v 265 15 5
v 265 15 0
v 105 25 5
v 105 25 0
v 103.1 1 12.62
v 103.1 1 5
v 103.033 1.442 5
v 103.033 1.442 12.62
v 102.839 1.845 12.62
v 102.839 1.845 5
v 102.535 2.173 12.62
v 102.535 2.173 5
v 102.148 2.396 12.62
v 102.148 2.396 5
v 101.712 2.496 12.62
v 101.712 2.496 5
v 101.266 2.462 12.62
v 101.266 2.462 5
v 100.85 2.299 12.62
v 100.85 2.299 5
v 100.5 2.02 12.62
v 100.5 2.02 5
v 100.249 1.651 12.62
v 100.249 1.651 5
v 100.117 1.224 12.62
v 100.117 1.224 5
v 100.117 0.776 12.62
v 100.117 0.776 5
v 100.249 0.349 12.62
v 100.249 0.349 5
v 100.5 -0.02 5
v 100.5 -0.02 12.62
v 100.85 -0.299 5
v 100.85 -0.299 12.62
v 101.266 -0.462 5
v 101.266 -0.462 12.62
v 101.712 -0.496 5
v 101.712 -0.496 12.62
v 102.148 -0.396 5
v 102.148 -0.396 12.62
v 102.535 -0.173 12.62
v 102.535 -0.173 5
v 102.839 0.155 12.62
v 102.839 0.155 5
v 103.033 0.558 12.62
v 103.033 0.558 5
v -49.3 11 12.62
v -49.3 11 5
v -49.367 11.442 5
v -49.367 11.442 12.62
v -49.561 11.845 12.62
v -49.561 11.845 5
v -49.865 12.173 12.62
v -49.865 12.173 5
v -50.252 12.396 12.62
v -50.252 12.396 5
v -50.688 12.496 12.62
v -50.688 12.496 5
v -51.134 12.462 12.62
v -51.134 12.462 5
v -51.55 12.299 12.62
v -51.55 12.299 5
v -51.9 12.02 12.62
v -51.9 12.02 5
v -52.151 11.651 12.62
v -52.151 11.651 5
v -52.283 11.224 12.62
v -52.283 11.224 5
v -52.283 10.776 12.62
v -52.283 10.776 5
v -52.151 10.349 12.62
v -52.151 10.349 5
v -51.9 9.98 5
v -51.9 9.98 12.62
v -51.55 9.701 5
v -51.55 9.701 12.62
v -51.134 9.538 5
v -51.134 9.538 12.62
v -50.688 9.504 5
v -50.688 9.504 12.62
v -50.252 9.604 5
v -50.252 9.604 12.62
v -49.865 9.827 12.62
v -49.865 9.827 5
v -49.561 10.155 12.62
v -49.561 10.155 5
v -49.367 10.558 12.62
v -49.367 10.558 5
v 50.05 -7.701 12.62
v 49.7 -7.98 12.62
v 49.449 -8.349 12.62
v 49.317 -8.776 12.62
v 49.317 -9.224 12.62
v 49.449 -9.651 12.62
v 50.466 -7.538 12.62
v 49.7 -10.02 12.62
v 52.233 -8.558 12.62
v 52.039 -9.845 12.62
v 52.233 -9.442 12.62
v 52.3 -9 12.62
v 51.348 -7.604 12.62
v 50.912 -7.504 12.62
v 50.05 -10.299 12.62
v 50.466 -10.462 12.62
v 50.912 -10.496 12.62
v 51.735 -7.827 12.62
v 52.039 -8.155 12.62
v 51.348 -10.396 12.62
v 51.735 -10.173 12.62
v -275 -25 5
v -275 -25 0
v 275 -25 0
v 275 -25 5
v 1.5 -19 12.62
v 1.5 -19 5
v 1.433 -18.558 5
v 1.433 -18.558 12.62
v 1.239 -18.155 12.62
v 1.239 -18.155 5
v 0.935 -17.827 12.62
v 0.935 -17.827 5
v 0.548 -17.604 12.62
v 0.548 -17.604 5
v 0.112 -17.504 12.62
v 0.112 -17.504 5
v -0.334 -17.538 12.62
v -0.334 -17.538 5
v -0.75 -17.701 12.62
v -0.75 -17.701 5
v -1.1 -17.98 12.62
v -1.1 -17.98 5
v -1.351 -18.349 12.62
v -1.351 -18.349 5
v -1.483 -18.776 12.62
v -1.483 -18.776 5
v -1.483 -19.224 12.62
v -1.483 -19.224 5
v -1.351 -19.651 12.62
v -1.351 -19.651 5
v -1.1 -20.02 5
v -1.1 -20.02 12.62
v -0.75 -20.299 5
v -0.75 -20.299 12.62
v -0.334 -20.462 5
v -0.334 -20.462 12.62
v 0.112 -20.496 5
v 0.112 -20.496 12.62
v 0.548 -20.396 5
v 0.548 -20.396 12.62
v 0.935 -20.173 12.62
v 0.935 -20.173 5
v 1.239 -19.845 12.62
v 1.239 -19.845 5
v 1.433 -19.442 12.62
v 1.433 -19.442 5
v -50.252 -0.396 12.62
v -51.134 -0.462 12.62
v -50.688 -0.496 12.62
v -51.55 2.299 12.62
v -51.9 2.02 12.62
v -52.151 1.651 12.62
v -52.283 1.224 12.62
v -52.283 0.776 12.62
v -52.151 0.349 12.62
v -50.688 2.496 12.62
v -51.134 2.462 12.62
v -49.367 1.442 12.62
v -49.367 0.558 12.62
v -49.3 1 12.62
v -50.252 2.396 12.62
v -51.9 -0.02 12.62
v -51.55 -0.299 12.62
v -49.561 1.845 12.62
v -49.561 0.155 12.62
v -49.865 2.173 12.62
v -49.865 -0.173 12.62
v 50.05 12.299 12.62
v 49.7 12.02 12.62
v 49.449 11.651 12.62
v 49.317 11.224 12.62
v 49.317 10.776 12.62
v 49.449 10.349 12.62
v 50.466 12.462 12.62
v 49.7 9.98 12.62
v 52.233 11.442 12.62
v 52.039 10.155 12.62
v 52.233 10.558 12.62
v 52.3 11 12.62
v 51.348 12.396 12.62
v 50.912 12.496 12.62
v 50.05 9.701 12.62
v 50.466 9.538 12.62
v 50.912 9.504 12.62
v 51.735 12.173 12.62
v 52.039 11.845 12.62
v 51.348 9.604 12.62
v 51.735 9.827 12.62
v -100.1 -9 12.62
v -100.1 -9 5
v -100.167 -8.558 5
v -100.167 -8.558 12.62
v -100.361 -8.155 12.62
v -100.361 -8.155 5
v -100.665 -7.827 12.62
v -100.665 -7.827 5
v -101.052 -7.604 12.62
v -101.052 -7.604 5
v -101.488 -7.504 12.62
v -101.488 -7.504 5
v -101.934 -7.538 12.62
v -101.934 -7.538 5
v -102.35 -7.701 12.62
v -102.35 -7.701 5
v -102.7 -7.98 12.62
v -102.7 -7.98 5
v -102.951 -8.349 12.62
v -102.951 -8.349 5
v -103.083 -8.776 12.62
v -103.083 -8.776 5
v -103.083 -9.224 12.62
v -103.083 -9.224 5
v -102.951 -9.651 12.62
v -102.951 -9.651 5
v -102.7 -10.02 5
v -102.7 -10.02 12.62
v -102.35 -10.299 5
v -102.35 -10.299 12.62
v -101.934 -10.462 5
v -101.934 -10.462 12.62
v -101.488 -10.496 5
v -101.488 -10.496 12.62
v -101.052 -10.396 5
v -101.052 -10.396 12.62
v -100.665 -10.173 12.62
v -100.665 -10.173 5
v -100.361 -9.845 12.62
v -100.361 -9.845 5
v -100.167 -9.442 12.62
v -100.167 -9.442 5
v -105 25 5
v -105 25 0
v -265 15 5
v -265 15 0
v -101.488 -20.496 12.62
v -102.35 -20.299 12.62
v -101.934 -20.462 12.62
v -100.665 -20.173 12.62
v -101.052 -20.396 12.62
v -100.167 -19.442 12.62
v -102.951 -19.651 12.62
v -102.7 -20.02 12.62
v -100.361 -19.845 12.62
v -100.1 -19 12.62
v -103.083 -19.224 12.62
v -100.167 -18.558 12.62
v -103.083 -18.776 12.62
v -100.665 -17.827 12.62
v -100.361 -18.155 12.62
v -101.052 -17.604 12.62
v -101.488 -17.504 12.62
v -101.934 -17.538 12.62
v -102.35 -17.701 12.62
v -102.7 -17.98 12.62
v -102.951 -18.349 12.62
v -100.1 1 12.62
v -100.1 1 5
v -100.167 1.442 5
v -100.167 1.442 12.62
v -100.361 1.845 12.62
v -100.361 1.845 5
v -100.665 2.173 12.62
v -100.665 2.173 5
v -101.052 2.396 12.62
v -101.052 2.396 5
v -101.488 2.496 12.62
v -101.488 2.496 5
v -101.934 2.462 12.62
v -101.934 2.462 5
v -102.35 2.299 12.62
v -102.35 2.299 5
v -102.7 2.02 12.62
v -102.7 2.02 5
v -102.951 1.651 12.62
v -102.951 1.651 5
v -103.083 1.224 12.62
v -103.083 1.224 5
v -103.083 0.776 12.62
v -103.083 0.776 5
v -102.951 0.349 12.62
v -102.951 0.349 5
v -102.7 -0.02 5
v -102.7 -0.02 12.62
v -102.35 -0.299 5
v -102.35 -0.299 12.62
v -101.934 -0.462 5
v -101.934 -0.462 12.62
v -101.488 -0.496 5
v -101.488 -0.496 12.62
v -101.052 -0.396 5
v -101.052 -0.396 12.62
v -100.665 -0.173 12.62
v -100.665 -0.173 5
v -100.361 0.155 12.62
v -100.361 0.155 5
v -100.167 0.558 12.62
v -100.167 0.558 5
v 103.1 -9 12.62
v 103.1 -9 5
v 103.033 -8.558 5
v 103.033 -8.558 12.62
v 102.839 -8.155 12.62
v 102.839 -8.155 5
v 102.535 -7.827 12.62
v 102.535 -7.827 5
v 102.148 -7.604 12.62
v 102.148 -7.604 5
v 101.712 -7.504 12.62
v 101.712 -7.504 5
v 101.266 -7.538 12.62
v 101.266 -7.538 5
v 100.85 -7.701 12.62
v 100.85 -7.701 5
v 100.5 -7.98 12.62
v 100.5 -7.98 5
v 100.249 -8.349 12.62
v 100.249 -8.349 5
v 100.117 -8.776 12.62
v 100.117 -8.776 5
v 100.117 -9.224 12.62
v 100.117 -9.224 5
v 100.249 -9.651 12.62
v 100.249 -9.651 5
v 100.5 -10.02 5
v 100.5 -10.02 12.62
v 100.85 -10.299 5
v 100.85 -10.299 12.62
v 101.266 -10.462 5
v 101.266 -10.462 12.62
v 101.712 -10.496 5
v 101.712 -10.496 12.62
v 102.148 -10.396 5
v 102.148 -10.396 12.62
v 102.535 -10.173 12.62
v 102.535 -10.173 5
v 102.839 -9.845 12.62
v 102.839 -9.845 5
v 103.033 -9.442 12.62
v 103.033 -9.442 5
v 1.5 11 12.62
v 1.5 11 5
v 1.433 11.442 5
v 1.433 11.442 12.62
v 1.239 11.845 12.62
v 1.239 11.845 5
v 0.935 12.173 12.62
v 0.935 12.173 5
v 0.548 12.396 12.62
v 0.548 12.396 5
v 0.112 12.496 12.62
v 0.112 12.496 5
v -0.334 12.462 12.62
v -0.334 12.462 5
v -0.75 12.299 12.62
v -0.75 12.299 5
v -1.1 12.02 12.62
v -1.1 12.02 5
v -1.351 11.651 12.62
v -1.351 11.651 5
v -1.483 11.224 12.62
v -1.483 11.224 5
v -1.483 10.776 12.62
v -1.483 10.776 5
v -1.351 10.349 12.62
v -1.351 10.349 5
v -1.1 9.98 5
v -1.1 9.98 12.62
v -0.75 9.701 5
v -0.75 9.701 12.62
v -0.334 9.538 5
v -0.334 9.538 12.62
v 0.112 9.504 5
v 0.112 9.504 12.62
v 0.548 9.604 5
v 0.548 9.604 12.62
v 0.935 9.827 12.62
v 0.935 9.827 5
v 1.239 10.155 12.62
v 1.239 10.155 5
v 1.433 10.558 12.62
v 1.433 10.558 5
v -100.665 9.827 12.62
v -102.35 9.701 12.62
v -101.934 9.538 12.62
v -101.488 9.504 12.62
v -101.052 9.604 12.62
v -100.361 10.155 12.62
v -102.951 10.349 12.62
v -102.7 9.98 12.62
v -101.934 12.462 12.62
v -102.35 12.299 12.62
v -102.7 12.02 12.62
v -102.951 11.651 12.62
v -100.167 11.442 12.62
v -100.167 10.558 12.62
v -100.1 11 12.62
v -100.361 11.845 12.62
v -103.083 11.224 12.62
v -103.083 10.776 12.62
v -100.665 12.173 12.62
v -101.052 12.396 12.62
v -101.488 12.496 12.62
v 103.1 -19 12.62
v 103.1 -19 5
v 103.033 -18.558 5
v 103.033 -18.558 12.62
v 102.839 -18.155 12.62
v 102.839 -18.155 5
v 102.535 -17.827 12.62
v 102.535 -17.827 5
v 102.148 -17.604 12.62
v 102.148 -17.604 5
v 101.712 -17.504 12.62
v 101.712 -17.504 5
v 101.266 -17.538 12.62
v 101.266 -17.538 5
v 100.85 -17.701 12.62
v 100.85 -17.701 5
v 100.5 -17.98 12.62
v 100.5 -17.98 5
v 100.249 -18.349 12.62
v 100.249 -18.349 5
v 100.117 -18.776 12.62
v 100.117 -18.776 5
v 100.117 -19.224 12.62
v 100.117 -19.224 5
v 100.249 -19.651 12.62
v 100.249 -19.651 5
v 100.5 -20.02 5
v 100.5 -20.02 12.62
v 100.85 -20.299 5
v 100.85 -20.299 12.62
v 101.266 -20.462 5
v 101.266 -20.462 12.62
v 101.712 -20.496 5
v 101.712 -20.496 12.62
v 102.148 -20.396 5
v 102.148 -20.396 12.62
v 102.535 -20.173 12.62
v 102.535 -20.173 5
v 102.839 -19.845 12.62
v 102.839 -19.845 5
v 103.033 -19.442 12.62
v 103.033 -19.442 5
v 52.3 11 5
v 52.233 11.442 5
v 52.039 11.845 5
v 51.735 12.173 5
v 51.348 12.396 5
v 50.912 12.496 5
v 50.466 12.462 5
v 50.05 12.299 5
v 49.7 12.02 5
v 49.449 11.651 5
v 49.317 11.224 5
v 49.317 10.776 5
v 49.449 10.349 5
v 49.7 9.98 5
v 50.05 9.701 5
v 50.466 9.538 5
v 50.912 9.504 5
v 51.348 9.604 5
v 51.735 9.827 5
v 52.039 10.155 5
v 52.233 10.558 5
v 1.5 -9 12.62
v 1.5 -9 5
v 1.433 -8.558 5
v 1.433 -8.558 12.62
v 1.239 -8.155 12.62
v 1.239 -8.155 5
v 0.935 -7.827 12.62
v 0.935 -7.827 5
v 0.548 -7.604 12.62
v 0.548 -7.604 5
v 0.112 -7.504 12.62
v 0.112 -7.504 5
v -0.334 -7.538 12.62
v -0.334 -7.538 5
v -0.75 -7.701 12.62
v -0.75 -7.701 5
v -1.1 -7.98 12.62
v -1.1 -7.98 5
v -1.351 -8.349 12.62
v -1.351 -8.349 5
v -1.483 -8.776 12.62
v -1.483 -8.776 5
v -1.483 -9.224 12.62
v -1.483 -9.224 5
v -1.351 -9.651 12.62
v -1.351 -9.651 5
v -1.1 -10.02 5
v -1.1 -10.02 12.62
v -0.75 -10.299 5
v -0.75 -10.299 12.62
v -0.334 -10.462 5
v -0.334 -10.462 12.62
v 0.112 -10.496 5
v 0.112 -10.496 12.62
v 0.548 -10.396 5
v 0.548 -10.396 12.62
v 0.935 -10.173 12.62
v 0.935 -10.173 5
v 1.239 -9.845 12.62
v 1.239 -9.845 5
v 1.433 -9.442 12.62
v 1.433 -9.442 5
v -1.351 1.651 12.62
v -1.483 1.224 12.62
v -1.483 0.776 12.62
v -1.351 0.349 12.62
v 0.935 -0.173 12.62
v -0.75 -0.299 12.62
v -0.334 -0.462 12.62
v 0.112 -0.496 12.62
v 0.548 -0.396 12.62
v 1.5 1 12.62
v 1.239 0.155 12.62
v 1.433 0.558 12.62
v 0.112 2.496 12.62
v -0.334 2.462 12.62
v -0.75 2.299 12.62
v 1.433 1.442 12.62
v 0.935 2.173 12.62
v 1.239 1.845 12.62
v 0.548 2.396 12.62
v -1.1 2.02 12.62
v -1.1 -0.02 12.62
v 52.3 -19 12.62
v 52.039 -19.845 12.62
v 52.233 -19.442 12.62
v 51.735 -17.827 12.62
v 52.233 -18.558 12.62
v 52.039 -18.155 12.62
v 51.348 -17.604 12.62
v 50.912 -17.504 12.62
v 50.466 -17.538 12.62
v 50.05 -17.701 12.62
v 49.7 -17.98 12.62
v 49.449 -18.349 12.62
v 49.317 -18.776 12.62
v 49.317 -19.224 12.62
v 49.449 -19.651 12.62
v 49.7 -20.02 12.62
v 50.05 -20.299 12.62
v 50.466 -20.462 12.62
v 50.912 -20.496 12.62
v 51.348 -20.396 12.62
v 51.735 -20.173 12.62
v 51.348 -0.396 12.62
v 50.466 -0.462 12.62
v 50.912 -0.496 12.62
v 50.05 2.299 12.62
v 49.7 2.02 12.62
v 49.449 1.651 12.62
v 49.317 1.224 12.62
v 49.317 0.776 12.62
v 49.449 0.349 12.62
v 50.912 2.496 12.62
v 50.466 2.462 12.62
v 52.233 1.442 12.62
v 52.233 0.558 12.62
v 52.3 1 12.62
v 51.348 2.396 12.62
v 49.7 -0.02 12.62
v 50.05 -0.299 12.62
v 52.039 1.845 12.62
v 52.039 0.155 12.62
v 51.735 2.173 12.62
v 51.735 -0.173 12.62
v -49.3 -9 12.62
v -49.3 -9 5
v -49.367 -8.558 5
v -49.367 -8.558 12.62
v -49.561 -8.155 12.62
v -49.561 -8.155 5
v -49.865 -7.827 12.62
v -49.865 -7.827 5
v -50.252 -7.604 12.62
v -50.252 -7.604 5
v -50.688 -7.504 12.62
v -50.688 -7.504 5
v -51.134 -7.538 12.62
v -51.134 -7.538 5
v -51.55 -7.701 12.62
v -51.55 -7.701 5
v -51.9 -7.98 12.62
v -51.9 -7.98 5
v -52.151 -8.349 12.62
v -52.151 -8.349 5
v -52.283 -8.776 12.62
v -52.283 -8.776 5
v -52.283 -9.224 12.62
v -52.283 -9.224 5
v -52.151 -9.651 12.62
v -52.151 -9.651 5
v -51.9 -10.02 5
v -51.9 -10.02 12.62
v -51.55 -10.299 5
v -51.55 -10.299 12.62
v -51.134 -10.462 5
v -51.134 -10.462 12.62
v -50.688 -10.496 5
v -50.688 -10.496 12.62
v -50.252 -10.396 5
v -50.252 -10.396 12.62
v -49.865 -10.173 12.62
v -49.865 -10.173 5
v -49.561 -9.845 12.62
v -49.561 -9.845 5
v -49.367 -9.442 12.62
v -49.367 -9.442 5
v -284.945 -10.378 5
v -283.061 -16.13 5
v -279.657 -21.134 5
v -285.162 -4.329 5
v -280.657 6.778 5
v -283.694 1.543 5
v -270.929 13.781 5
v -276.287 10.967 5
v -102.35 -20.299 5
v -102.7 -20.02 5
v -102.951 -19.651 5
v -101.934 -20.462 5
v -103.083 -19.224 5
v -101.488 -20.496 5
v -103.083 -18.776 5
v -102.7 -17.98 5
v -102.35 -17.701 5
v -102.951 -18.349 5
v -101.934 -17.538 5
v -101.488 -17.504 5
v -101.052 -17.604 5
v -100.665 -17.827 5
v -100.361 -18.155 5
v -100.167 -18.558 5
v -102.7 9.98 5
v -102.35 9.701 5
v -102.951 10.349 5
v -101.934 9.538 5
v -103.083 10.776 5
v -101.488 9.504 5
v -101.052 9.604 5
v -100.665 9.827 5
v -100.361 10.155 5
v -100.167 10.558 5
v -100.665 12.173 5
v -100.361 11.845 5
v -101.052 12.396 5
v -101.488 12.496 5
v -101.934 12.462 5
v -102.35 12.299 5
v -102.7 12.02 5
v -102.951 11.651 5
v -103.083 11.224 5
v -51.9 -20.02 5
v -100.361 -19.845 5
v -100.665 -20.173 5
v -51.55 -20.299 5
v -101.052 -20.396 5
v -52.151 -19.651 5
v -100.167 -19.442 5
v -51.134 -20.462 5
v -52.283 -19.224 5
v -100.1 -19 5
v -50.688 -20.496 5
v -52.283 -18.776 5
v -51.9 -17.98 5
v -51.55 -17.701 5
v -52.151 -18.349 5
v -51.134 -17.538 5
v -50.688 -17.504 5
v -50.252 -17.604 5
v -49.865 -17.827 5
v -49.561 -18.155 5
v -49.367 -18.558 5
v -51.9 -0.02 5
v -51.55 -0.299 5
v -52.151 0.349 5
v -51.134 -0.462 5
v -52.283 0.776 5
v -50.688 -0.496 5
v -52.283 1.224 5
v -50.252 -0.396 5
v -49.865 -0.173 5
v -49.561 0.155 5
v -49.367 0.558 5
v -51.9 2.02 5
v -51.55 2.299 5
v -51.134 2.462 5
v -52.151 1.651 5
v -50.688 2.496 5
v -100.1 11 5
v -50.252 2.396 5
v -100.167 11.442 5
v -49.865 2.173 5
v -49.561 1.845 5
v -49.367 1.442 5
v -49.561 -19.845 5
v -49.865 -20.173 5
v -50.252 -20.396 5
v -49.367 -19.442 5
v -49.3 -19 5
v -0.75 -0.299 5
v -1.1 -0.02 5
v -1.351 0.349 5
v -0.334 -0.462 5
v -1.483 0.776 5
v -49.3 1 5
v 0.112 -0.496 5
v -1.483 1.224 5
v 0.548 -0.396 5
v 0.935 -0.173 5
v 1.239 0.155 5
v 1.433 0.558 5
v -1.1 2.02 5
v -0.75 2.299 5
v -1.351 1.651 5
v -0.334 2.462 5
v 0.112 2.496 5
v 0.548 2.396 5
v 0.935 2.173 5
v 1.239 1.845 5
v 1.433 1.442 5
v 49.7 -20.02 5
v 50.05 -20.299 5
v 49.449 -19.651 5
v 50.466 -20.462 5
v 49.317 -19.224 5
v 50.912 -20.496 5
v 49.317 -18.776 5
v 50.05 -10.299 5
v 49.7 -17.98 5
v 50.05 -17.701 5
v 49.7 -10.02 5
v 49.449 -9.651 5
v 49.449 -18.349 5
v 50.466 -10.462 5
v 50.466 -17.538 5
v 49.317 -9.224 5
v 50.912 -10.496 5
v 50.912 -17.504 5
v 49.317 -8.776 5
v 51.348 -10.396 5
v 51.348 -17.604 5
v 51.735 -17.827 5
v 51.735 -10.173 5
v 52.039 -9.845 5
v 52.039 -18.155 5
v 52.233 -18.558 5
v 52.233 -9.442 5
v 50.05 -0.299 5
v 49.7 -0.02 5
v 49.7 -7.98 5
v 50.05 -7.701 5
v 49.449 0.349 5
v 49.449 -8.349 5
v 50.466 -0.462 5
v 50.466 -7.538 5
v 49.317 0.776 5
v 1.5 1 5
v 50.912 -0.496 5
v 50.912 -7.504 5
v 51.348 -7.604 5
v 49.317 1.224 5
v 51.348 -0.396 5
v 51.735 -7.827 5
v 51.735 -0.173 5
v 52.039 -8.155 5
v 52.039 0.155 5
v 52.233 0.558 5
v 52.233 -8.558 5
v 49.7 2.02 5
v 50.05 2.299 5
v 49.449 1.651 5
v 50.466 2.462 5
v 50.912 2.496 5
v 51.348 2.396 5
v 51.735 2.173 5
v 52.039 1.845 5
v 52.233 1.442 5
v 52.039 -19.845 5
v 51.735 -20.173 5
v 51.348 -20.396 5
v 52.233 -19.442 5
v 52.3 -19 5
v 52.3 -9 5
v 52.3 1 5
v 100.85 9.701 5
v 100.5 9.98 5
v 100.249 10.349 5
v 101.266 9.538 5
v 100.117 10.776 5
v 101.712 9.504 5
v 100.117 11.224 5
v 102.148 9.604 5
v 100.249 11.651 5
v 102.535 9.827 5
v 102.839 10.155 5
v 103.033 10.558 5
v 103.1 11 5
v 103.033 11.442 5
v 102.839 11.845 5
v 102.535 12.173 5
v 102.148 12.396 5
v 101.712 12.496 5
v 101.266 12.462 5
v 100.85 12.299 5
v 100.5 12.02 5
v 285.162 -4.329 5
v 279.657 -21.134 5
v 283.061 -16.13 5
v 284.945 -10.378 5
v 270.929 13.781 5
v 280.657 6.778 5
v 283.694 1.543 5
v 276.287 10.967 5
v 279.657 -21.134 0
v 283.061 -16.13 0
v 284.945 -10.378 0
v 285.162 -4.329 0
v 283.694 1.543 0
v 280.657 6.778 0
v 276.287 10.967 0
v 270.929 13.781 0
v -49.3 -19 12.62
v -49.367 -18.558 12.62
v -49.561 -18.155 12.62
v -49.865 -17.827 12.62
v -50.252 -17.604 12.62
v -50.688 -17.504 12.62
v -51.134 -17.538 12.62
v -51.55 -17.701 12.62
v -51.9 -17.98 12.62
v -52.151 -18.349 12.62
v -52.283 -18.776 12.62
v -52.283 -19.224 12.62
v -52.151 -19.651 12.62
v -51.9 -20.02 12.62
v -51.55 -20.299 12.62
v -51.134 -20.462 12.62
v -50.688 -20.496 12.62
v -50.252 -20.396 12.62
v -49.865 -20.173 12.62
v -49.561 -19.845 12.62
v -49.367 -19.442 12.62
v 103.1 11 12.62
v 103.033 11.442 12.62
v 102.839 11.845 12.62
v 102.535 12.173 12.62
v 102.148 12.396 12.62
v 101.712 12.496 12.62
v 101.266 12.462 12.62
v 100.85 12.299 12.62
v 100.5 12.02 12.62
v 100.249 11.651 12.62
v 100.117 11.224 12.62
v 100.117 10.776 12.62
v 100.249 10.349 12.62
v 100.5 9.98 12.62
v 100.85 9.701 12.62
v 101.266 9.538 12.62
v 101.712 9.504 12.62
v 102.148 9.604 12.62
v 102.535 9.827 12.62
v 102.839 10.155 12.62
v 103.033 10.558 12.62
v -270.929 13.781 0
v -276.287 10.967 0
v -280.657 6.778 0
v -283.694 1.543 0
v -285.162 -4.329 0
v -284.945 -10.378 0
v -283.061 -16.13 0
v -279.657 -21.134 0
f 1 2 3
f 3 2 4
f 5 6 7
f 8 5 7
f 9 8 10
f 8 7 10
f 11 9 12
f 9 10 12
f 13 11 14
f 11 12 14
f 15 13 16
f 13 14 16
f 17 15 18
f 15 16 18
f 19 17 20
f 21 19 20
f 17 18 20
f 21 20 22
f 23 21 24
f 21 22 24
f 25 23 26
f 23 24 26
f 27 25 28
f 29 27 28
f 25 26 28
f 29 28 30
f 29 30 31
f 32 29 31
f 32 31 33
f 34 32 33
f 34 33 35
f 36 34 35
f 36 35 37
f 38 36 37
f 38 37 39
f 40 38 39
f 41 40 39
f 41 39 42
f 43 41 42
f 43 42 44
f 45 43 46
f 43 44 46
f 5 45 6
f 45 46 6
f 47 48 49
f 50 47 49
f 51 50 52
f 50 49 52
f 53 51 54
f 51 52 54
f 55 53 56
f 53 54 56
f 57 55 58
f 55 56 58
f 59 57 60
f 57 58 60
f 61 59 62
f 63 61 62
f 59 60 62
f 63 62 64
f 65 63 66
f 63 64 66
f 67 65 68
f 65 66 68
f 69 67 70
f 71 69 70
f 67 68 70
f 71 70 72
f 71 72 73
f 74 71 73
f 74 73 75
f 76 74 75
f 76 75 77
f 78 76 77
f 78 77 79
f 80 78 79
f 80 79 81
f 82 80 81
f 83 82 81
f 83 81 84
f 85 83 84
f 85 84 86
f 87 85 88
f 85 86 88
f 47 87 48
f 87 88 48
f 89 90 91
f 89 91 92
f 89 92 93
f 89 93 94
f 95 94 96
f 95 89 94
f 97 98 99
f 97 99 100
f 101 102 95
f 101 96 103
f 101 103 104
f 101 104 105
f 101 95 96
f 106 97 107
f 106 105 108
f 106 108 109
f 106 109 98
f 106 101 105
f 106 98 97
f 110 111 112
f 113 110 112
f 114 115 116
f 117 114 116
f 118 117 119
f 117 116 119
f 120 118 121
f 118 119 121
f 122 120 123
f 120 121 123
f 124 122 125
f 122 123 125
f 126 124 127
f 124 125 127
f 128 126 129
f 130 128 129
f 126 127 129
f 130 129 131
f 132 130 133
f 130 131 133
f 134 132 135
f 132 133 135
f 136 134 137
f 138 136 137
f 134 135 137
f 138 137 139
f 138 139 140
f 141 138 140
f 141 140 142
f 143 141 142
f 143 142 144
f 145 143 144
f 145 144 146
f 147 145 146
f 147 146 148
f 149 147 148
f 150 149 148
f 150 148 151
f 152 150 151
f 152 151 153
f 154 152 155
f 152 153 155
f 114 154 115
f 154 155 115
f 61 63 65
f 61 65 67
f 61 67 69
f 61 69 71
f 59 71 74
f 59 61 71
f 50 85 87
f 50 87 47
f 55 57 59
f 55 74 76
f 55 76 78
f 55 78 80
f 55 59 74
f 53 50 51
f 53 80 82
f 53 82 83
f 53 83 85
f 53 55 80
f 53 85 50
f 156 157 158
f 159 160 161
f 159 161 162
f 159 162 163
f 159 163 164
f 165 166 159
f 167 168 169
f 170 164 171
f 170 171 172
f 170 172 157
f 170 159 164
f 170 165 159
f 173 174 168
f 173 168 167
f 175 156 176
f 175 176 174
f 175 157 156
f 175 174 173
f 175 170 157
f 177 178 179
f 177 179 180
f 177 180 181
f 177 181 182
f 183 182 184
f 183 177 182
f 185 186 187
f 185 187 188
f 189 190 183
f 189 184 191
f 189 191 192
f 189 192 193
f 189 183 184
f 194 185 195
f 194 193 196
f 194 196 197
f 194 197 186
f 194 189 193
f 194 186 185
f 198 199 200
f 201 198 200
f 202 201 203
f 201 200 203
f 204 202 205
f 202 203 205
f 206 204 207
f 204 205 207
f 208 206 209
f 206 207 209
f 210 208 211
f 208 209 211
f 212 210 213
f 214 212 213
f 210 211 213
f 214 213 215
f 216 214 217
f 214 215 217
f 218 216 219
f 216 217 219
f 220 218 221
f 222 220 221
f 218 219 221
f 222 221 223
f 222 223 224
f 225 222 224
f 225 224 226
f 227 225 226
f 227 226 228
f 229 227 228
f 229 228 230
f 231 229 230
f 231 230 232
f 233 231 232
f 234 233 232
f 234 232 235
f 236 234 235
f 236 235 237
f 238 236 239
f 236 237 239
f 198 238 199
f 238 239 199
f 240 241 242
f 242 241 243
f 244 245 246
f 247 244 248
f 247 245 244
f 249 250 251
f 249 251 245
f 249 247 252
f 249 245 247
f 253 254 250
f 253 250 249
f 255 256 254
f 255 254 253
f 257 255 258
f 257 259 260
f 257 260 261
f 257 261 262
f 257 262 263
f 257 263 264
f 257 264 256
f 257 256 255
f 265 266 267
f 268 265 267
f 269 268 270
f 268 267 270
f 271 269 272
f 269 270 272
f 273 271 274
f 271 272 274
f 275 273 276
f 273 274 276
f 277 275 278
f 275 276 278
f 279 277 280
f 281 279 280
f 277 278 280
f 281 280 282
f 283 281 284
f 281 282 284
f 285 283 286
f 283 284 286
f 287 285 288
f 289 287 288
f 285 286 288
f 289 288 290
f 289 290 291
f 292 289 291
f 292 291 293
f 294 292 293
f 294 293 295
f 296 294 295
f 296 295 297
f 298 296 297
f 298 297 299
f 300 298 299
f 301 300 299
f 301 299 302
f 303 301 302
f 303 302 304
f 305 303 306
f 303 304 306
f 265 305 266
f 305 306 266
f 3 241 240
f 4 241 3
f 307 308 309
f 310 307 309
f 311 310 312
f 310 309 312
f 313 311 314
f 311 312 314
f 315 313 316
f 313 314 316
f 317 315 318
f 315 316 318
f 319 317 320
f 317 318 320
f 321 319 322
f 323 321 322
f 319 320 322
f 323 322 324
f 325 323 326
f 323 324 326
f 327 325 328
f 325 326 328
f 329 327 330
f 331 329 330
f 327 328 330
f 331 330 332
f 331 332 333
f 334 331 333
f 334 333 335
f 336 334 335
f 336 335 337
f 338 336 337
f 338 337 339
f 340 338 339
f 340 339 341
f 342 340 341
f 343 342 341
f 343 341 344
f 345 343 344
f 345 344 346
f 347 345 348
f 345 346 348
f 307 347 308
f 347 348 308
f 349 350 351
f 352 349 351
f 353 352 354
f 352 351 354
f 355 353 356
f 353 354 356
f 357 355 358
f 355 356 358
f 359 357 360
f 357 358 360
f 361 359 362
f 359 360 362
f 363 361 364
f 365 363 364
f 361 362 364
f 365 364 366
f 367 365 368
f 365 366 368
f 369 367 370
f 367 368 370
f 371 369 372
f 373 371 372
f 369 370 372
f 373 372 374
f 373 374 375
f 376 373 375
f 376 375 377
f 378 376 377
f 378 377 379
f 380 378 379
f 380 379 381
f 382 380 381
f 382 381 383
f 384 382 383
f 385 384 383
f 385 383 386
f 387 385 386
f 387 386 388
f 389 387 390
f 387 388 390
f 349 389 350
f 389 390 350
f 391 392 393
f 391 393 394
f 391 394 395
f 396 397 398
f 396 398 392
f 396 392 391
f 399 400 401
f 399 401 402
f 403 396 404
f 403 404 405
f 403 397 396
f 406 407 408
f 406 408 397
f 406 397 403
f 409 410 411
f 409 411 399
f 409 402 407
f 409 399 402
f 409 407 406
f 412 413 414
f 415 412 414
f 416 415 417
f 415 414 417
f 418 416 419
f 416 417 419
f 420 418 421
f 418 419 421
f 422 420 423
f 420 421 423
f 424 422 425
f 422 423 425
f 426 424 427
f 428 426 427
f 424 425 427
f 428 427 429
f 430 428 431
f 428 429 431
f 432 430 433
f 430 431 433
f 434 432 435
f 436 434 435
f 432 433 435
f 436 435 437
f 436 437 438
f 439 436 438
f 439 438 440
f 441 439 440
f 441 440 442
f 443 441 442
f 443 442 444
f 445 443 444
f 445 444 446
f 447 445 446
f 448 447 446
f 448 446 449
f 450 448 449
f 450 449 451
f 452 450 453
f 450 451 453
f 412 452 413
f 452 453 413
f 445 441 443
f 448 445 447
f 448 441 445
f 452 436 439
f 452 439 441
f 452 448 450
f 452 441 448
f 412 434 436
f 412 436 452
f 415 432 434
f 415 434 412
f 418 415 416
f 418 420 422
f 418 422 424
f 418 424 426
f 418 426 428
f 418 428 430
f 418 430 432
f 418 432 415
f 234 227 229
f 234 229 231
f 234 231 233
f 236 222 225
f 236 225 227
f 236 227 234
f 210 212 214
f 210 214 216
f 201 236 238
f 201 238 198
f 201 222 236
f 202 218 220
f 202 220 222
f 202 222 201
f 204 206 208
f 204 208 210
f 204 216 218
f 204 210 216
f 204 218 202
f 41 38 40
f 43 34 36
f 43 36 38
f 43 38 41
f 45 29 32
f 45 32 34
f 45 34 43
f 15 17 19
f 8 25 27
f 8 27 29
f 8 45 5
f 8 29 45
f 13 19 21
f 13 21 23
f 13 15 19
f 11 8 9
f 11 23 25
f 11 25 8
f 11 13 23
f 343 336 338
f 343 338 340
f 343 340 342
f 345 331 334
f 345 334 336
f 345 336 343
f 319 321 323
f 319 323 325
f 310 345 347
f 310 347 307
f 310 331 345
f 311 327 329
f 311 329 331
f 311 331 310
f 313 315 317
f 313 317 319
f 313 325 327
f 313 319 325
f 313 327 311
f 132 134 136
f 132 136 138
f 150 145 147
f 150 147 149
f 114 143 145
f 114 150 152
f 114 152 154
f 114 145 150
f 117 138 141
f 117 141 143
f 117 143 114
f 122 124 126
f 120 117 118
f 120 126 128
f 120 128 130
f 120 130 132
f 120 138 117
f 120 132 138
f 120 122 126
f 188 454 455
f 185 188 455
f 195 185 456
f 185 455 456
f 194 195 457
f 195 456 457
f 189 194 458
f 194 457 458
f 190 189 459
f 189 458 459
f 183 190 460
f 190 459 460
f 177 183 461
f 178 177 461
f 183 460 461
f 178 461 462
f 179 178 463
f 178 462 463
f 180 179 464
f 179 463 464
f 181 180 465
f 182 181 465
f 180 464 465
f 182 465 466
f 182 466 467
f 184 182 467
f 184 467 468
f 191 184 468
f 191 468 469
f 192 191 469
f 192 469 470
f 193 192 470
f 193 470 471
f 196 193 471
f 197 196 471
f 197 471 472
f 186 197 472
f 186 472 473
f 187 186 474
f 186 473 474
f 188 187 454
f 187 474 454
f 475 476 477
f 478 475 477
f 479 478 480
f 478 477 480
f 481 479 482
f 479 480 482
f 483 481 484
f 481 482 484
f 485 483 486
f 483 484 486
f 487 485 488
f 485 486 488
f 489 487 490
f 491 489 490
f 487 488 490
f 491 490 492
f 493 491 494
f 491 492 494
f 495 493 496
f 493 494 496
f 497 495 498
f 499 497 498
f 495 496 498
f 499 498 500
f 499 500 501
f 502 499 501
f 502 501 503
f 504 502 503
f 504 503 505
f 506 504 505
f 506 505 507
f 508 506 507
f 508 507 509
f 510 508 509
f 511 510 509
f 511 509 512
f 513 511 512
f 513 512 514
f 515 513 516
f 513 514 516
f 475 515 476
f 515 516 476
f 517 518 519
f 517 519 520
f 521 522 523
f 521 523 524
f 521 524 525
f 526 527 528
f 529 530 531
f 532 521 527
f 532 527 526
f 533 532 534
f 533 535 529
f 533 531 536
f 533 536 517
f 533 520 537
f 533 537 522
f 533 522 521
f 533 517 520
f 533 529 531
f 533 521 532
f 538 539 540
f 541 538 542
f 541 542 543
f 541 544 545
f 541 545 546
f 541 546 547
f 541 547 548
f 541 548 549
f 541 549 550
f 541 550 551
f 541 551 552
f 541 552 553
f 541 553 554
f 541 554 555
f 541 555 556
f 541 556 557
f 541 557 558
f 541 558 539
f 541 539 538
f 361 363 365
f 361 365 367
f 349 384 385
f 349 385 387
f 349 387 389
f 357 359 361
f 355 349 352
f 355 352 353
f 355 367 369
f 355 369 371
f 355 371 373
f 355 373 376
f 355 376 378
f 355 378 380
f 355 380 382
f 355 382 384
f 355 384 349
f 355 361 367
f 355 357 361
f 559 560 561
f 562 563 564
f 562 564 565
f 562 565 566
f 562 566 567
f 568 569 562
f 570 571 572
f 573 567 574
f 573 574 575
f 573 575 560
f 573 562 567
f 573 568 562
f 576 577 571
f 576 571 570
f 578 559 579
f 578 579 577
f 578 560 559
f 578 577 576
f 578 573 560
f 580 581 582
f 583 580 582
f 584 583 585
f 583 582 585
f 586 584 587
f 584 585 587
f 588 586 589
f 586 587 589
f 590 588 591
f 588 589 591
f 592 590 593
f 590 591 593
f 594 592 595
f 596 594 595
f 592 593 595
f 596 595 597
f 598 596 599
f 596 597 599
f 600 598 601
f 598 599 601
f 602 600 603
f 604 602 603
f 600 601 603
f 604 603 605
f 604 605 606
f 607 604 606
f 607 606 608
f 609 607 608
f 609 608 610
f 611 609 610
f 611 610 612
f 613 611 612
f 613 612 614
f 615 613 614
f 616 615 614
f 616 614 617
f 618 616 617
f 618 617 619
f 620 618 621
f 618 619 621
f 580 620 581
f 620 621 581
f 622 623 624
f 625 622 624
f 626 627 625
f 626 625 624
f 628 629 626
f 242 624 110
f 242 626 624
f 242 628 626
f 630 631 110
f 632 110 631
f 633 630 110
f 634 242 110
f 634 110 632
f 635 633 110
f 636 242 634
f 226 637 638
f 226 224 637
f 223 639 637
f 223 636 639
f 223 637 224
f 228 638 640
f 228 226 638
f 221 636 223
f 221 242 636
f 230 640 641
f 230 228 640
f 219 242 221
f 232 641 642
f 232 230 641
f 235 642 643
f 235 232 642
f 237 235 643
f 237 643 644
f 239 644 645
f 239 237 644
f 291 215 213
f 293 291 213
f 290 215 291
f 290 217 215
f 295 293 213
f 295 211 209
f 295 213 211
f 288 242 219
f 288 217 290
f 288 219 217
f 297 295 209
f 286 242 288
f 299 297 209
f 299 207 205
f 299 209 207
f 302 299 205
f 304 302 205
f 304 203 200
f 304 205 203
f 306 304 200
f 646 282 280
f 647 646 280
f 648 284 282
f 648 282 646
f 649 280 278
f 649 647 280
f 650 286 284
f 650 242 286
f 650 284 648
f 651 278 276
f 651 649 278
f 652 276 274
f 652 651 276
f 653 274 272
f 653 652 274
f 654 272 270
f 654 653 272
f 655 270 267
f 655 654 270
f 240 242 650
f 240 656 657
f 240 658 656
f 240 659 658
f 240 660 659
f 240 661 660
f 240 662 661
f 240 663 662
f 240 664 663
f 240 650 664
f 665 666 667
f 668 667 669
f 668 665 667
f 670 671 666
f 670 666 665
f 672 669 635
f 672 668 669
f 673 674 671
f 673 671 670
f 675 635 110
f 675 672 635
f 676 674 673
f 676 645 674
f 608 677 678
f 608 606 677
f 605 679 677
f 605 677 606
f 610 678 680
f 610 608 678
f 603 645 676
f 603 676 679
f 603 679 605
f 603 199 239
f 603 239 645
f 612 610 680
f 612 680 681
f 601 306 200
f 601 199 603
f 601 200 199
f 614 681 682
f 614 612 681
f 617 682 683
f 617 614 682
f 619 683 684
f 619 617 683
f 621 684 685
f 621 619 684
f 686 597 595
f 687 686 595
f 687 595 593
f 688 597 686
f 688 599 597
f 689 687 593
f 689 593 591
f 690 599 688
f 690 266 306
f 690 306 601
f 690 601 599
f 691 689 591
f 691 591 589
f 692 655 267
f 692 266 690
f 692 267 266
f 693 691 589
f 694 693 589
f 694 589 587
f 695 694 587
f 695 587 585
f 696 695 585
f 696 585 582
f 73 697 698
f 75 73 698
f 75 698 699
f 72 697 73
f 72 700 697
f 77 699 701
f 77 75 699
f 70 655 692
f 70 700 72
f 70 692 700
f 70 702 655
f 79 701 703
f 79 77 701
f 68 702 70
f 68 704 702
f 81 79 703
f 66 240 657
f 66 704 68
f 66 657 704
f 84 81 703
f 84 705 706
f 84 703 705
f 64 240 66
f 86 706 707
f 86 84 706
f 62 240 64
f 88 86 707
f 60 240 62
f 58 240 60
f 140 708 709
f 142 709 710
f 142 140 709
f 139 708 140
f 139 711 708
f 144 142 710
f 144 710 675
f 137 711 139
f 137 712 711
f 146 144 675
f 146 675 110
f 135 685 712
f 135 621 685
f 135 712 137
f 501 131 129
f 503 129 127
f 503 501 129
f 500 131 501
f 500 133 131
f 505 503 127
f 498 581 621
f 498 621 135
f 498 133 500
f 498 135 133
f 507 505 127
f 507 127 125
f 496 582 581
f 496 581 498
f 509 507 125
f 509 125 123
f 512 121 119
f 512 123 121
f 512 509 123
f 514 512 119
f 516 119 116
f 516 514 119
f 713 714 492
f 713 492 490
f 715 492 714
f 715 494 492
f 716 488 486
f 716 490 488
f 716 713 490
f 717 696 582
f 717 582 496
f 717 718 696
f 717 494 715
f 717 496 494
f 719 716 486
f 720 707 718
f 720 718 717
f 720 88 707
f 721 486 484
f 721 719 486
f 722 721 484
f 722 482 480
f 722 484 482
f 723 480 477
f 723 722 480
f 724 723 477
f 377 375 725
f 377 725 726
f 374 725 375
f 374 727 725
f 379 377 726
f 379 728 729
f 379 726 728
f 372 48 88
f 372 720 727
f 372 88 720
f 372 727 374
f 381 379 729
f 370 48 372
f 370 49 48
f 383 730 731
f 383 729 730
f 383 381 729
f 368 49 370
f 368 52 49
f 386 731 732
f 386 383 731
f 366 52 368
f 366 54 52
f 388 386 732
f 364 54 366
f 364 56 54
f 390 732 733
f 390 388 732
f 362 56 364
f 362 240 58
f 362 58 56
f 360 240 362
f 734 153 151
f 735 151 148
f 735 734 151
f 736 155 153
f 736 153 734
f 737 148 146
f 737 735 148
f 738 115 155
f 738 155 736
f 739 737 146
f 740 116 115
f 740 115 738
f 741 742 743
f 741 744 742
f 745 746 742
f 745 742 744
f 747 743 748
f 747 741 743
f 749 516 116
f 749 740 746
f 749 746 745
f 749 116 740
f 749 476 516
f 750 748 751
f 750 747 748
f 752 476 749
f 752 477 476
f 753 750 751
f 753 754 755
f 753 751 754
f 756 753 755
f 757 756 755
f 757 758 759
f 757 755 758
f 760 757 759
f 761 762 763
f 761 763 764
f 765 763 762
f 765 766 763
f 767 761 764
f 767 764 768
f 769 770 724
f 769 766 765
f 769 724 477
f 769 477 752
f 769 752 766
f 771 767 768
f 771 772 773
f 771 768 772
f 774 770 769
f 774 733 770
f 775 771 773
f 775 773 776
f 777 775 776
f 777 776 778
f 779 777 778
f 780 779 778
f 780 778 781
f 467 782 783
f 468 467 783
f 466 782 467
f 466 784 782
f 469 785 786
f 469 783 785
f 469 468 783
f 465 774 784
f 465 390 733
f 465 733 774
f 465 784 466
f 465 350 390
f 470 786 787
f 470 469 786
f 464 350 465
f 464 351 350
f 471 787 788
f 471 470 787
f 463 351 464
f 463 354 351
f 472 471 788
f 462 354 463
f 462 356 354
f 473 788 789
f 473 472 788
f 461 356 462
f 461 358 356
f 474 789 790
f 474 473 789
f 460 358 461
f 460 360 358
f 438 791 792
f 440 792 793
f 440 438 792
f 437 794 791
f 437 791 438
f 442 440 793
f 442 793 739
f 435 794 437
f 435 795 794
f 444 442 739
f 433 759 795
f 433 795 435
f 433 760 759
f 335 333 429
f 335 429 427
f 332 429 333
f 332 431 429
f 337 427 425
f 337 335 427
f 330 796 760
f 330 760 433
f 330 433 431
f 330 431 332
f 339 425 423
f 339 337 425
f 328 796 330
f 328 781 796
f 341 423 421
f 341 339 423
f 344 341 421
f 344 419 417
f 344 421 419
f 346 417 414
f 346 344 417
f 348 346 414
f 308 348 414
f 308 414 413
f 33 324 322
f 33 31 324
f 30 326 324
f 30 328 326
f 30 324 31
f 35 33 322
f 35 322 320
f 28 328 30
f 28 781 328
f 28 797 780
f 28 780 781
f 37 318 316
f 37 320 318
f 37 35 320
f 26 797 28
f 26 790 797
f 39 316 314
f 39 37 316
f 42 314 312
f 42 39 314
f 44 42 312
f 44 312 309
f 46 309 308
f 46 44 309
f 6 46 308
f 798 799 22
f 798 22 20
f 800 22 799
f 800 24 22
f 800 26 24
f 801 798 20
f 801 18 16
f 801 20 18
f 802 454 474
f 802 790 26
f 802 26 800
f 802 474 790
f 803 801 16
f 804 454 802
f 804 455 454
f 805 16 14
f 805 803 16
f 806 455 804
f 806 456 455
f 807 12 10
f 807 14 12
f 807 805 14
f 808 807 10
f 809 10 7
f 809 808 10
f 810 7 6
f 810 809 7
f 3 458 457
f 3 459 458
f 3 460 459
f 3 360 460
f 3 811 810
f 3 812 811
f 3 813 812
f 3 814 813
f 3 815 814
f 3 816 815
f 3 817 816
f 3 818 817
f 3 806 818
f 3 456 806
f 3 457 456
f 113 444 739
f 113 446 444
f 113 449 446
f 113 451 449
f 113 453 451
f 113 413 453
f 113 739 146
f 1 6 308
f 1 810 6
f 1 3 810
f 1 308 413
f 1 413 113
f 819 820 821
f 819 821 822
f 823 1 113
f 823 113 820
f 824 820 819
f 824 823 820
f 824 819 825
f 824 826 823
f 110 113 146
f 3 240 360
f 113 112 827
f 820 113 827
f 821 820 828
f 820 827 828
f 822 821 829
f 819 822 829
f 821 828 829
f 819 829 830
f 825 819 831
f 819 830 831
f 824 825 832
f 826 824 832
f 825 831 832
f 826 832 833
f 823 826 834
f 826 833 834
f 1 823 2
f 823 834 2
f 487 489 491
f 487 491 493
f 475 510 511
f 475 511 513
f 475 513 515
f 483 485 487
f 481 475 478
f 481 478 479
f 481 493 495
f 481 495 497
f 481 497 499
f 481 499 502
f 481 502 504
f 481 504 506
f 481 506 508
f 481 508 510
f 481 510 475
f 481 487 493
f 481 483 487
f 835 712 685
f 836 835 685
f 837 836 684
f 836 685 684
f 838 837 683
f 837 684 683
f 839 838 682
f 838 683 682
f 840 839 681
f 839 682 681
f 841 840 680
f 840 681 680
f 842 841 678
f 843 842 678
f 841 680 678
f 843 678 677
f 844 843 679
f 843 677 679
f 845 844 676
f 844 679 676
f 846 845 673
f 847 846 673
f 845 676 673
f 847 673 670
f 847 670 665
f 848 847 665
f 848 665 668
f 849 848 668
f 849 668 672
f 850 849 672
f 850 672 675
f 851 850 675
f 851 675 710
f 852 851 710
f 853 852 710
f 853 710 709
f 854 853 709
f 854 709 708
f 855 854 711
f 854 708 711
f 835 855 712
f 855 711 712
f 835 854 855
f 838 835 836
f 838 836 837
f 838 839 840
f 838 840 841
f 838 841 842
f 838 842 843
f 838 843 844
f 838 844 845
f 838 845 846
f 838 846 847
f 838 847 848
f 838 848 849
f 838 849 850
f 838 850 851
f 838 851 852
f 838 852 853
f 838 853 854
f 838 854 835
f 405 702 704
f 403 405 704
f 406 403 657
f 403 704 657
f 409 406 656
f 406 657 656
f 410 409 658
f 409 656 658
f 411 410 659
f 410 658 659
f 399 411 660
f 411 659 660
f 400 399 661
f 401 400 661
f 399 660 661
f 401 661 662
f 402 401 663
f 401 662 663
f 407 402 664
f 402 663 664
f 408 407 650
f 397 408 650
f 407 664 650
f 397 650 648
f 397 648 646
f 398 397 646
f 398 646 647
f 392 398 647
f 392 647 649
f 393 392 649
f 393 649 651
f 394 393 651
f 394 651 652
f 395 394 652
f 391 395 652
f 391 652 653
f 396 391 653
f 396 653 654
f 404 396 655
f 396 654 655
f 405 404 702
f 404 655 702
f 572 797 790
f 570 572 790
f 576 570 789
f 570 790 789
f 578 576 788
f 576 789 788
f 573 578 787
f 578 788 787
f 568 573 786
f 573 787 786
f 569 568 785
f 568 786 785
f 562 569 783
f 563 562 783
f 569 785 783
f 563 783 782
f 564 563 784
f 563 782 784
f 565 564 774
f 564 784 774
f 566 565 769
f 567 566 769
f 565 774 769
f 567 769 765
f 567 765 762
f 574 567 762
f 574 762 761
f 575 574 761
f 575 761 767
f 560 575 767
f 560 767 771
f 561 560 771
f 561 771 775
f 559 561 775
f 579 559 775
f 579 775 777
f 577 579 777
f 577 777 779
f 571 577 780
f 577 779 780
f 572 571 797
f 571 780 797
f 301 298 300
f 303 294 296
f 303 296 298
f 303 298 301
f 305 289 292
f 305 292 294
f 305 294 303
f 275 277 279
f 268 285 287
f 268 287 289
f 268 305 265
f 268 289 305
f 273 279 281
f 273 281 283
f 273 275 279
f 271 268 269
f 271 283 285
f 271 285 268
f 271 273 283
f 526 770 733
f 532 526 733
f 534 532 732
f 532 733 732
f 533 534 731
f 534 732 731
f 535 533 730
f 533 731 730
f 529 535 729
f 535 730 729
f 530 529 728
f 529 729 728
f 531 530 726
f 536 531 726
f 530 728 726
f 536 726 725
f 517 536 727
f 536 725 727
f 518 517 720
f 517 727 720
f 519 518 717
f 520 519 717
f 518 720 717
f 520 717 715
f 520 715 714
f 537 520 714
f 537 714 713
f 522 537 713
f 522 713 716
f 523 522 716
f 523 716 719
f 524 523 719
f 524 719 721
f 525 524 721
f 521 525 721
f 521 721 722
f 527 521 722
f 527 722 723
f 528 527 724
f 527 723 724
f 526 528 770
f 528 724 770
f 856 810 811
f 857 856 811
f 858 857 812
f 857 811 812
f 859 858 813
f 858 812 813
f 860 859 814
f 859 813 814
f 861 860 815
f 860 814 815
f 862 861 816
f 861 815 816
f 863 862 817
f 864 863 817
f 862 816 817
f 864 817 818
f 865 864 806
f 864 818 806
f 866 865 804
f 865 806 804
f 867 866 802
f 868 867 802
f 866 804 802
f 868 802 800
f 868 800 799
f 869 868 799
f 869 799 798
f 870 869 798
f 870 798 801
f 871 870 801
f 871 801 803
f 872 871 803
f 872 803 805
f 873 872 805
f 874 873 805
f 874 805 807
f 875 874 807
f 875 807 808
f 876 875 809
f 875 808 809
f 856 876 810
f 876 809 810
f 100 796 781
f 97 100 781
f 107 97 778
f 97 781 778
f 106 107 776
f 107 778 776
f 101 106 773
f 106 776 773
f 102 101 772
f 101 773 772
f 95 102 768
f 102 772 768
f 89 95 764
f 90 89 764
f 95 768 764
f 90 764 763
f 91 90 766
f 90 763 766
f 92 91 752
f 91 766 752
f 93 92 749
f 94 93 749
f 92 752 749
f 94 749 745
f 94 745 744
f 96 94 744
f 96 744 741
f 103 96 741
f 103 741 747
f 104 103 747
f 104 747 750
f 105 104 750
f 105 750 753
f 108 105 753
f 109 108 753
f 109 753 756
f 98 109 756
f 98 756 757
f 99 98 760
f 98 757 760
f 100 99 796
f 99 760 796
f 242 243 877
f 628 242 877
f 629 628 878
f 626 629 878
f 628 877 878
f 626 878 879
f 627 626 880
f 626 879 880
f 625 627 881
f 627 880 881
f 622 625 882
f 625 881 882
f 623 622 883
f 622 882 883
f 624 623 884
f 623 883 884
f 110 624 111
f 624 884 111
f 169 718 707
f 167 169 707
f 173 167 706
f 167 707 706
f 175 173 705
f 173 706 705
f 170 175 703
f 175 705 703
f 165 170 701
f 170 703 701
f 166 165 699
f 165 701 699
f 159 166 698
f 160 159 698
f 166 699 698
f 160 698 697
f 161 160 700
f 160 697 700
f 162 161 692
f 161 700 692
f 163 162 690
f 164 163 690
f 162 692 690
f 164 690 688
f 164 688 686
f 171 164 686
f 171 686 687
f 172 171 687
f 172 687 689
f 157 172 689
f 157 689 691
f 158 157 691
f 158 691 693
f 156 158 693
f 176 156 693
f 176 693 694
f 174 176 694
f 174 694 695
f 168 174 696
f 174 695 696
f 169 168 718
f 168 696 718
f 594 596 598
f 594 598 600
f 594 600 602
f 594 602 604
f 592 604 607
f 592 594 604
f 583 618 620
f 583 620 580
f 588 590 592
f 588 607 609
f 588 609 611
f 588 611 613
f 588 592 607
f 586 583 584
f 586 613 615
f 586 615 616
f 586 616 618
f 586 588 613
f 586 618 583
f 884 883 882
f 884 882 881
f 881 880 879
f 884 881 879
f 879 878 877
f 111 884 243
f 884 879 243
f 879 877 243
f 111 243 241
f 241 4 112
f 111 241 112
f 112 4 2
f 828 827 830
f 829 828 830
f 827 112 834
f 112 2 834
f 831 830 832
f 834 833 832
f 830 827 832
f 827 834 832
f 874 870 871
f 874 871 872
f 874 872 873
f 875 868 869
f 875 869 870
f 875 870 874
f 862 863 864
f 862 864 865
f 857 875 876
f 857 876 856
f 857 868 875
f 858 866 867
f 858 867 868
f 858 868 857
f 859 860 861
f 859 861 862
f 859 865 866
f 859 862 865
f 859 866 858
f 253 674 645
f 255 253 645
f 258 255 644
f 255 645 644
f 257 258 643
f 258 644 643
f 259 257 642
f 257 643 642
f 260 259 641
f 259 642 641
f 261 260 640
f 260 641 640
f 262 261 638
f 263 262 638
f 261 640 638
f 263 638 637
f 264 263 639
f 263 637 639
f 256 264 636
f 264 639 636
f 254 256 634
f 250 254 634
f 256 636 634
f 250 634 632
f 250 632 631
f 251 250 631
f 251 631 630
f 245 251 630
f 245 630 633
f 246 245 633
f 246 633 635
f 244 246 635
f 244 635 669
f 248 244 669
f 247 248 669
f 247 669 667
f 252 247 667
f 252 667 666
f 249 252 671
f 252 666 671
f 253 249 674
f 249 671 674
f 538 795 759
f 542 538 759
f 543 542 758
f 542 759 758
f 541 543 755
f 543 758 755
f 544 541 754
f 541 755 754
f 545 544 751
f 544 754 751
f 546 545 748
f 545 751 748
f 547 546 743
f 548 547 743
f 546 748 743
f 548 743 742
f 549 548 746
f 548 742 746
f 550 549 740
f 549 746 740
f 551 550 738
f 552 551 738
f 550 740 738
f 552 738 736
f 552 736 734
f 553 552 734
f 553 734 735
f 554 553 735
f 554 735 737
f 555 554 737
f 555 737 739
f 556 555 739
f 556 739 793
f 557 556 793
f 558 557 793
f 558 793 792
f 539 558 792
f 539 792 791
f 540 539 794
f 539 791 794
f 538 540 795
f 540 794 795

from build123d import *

# Parameters (mm, degrees)
SKETCH3_W           = 210
SKETCH3_H           = 50
BOSS_EXTRUDE1_DEPTH = 5
SKETCH8_R           = 1.5
BOSS_EXTRUDE2_DEPTH = 7.62


with BuildPart() as part:
    # Sketch3 → Boss-Extrude1 (new body)
    with BuildSketch(Plane.XY):
        Polygon((-265, -25), (-105, -25), (-105, 25), (-265, 15), align=None)
        with BuildLine():
            Line((-275, -25), (-265, -25))
            Line((-265, -25), (-265, 15))
            ThreePointArc((-265, 15), (-284.634416342, -1.341395914), (-275, -25))
        make_face()
        Rectangle(SKETCH3_W, SKETCH3_H)
        Polygon((105, 25), (105, -25), (265, -25), (265, 15), align=None)
        with BuildLine():
            Line((265, 15), (265, -25))
            Line((265, -25), (275, -25))
            ThreePointArc((275, -25), (284.634416342, -1.341395914), (265, 15))
        make_face()
    extrude(amount=BOSS_EXTRUDE1_DEPTH)

    # Sketch8 → Boss-Extrude2 (add)
    with BuildSketch(Plane.XY.offset(5)):
        with Locations((0, 11)):
            Circle(SKETCH8_R)
        with Locations((0, 1)):
            Circle(SKETCH8_R)
        with Locations((0, -9)):
            Circle(SKETCH8_R)
        with Locations((0, -19)):
            Circle(SKETCH8_R)
        with Locations((50.8, 11)):
            Circle(SKETCH8_R)
        with Locations((50.8, -9)):
            Circle(SKETCH8_R)
        with Locations((50.8, 1)):
            Circle(SKETCH8_R)
        with Locations((50.8, -19)):
            Circle(SKETCH8_R)
        with Locations((101.6, 11)):
            Circle(SKETCH8_R)
        with Locations((101.6, -9)):
            Circle(SKETCH8_R)
        with Locations((101.6, 1)):
            Circle(SKETCH8_R)
        with Locations((101.6, -19)):
            Circle(SKETCH8_R)
        with Locations((-50.8, 11)):
            Circle(SKETCH8_R)
        with Locations((-50.8, 1)):
            Circle(SKETCH8_R)
        with Locations((-50.8, -9)):
            Circle(SKETCH8_R)
        with Locations((-50.8, -19)):
            Circle(SKETCH8_R)
        with Locations((-101.6, 11)):
            Circle(SKETCH8_R)
        with Locations((-101.6, 1)):
            Circle(SKETCH8_R)
        with Locations((-101.6, -9)):
            Circle(SKETCH8_R)
        with Locations((-101.6, -19)):
            Circle(SKETCH8_R)
    extrude(amount=BOSS_EXTRUDE2_DEPTH)


solid = part.part
